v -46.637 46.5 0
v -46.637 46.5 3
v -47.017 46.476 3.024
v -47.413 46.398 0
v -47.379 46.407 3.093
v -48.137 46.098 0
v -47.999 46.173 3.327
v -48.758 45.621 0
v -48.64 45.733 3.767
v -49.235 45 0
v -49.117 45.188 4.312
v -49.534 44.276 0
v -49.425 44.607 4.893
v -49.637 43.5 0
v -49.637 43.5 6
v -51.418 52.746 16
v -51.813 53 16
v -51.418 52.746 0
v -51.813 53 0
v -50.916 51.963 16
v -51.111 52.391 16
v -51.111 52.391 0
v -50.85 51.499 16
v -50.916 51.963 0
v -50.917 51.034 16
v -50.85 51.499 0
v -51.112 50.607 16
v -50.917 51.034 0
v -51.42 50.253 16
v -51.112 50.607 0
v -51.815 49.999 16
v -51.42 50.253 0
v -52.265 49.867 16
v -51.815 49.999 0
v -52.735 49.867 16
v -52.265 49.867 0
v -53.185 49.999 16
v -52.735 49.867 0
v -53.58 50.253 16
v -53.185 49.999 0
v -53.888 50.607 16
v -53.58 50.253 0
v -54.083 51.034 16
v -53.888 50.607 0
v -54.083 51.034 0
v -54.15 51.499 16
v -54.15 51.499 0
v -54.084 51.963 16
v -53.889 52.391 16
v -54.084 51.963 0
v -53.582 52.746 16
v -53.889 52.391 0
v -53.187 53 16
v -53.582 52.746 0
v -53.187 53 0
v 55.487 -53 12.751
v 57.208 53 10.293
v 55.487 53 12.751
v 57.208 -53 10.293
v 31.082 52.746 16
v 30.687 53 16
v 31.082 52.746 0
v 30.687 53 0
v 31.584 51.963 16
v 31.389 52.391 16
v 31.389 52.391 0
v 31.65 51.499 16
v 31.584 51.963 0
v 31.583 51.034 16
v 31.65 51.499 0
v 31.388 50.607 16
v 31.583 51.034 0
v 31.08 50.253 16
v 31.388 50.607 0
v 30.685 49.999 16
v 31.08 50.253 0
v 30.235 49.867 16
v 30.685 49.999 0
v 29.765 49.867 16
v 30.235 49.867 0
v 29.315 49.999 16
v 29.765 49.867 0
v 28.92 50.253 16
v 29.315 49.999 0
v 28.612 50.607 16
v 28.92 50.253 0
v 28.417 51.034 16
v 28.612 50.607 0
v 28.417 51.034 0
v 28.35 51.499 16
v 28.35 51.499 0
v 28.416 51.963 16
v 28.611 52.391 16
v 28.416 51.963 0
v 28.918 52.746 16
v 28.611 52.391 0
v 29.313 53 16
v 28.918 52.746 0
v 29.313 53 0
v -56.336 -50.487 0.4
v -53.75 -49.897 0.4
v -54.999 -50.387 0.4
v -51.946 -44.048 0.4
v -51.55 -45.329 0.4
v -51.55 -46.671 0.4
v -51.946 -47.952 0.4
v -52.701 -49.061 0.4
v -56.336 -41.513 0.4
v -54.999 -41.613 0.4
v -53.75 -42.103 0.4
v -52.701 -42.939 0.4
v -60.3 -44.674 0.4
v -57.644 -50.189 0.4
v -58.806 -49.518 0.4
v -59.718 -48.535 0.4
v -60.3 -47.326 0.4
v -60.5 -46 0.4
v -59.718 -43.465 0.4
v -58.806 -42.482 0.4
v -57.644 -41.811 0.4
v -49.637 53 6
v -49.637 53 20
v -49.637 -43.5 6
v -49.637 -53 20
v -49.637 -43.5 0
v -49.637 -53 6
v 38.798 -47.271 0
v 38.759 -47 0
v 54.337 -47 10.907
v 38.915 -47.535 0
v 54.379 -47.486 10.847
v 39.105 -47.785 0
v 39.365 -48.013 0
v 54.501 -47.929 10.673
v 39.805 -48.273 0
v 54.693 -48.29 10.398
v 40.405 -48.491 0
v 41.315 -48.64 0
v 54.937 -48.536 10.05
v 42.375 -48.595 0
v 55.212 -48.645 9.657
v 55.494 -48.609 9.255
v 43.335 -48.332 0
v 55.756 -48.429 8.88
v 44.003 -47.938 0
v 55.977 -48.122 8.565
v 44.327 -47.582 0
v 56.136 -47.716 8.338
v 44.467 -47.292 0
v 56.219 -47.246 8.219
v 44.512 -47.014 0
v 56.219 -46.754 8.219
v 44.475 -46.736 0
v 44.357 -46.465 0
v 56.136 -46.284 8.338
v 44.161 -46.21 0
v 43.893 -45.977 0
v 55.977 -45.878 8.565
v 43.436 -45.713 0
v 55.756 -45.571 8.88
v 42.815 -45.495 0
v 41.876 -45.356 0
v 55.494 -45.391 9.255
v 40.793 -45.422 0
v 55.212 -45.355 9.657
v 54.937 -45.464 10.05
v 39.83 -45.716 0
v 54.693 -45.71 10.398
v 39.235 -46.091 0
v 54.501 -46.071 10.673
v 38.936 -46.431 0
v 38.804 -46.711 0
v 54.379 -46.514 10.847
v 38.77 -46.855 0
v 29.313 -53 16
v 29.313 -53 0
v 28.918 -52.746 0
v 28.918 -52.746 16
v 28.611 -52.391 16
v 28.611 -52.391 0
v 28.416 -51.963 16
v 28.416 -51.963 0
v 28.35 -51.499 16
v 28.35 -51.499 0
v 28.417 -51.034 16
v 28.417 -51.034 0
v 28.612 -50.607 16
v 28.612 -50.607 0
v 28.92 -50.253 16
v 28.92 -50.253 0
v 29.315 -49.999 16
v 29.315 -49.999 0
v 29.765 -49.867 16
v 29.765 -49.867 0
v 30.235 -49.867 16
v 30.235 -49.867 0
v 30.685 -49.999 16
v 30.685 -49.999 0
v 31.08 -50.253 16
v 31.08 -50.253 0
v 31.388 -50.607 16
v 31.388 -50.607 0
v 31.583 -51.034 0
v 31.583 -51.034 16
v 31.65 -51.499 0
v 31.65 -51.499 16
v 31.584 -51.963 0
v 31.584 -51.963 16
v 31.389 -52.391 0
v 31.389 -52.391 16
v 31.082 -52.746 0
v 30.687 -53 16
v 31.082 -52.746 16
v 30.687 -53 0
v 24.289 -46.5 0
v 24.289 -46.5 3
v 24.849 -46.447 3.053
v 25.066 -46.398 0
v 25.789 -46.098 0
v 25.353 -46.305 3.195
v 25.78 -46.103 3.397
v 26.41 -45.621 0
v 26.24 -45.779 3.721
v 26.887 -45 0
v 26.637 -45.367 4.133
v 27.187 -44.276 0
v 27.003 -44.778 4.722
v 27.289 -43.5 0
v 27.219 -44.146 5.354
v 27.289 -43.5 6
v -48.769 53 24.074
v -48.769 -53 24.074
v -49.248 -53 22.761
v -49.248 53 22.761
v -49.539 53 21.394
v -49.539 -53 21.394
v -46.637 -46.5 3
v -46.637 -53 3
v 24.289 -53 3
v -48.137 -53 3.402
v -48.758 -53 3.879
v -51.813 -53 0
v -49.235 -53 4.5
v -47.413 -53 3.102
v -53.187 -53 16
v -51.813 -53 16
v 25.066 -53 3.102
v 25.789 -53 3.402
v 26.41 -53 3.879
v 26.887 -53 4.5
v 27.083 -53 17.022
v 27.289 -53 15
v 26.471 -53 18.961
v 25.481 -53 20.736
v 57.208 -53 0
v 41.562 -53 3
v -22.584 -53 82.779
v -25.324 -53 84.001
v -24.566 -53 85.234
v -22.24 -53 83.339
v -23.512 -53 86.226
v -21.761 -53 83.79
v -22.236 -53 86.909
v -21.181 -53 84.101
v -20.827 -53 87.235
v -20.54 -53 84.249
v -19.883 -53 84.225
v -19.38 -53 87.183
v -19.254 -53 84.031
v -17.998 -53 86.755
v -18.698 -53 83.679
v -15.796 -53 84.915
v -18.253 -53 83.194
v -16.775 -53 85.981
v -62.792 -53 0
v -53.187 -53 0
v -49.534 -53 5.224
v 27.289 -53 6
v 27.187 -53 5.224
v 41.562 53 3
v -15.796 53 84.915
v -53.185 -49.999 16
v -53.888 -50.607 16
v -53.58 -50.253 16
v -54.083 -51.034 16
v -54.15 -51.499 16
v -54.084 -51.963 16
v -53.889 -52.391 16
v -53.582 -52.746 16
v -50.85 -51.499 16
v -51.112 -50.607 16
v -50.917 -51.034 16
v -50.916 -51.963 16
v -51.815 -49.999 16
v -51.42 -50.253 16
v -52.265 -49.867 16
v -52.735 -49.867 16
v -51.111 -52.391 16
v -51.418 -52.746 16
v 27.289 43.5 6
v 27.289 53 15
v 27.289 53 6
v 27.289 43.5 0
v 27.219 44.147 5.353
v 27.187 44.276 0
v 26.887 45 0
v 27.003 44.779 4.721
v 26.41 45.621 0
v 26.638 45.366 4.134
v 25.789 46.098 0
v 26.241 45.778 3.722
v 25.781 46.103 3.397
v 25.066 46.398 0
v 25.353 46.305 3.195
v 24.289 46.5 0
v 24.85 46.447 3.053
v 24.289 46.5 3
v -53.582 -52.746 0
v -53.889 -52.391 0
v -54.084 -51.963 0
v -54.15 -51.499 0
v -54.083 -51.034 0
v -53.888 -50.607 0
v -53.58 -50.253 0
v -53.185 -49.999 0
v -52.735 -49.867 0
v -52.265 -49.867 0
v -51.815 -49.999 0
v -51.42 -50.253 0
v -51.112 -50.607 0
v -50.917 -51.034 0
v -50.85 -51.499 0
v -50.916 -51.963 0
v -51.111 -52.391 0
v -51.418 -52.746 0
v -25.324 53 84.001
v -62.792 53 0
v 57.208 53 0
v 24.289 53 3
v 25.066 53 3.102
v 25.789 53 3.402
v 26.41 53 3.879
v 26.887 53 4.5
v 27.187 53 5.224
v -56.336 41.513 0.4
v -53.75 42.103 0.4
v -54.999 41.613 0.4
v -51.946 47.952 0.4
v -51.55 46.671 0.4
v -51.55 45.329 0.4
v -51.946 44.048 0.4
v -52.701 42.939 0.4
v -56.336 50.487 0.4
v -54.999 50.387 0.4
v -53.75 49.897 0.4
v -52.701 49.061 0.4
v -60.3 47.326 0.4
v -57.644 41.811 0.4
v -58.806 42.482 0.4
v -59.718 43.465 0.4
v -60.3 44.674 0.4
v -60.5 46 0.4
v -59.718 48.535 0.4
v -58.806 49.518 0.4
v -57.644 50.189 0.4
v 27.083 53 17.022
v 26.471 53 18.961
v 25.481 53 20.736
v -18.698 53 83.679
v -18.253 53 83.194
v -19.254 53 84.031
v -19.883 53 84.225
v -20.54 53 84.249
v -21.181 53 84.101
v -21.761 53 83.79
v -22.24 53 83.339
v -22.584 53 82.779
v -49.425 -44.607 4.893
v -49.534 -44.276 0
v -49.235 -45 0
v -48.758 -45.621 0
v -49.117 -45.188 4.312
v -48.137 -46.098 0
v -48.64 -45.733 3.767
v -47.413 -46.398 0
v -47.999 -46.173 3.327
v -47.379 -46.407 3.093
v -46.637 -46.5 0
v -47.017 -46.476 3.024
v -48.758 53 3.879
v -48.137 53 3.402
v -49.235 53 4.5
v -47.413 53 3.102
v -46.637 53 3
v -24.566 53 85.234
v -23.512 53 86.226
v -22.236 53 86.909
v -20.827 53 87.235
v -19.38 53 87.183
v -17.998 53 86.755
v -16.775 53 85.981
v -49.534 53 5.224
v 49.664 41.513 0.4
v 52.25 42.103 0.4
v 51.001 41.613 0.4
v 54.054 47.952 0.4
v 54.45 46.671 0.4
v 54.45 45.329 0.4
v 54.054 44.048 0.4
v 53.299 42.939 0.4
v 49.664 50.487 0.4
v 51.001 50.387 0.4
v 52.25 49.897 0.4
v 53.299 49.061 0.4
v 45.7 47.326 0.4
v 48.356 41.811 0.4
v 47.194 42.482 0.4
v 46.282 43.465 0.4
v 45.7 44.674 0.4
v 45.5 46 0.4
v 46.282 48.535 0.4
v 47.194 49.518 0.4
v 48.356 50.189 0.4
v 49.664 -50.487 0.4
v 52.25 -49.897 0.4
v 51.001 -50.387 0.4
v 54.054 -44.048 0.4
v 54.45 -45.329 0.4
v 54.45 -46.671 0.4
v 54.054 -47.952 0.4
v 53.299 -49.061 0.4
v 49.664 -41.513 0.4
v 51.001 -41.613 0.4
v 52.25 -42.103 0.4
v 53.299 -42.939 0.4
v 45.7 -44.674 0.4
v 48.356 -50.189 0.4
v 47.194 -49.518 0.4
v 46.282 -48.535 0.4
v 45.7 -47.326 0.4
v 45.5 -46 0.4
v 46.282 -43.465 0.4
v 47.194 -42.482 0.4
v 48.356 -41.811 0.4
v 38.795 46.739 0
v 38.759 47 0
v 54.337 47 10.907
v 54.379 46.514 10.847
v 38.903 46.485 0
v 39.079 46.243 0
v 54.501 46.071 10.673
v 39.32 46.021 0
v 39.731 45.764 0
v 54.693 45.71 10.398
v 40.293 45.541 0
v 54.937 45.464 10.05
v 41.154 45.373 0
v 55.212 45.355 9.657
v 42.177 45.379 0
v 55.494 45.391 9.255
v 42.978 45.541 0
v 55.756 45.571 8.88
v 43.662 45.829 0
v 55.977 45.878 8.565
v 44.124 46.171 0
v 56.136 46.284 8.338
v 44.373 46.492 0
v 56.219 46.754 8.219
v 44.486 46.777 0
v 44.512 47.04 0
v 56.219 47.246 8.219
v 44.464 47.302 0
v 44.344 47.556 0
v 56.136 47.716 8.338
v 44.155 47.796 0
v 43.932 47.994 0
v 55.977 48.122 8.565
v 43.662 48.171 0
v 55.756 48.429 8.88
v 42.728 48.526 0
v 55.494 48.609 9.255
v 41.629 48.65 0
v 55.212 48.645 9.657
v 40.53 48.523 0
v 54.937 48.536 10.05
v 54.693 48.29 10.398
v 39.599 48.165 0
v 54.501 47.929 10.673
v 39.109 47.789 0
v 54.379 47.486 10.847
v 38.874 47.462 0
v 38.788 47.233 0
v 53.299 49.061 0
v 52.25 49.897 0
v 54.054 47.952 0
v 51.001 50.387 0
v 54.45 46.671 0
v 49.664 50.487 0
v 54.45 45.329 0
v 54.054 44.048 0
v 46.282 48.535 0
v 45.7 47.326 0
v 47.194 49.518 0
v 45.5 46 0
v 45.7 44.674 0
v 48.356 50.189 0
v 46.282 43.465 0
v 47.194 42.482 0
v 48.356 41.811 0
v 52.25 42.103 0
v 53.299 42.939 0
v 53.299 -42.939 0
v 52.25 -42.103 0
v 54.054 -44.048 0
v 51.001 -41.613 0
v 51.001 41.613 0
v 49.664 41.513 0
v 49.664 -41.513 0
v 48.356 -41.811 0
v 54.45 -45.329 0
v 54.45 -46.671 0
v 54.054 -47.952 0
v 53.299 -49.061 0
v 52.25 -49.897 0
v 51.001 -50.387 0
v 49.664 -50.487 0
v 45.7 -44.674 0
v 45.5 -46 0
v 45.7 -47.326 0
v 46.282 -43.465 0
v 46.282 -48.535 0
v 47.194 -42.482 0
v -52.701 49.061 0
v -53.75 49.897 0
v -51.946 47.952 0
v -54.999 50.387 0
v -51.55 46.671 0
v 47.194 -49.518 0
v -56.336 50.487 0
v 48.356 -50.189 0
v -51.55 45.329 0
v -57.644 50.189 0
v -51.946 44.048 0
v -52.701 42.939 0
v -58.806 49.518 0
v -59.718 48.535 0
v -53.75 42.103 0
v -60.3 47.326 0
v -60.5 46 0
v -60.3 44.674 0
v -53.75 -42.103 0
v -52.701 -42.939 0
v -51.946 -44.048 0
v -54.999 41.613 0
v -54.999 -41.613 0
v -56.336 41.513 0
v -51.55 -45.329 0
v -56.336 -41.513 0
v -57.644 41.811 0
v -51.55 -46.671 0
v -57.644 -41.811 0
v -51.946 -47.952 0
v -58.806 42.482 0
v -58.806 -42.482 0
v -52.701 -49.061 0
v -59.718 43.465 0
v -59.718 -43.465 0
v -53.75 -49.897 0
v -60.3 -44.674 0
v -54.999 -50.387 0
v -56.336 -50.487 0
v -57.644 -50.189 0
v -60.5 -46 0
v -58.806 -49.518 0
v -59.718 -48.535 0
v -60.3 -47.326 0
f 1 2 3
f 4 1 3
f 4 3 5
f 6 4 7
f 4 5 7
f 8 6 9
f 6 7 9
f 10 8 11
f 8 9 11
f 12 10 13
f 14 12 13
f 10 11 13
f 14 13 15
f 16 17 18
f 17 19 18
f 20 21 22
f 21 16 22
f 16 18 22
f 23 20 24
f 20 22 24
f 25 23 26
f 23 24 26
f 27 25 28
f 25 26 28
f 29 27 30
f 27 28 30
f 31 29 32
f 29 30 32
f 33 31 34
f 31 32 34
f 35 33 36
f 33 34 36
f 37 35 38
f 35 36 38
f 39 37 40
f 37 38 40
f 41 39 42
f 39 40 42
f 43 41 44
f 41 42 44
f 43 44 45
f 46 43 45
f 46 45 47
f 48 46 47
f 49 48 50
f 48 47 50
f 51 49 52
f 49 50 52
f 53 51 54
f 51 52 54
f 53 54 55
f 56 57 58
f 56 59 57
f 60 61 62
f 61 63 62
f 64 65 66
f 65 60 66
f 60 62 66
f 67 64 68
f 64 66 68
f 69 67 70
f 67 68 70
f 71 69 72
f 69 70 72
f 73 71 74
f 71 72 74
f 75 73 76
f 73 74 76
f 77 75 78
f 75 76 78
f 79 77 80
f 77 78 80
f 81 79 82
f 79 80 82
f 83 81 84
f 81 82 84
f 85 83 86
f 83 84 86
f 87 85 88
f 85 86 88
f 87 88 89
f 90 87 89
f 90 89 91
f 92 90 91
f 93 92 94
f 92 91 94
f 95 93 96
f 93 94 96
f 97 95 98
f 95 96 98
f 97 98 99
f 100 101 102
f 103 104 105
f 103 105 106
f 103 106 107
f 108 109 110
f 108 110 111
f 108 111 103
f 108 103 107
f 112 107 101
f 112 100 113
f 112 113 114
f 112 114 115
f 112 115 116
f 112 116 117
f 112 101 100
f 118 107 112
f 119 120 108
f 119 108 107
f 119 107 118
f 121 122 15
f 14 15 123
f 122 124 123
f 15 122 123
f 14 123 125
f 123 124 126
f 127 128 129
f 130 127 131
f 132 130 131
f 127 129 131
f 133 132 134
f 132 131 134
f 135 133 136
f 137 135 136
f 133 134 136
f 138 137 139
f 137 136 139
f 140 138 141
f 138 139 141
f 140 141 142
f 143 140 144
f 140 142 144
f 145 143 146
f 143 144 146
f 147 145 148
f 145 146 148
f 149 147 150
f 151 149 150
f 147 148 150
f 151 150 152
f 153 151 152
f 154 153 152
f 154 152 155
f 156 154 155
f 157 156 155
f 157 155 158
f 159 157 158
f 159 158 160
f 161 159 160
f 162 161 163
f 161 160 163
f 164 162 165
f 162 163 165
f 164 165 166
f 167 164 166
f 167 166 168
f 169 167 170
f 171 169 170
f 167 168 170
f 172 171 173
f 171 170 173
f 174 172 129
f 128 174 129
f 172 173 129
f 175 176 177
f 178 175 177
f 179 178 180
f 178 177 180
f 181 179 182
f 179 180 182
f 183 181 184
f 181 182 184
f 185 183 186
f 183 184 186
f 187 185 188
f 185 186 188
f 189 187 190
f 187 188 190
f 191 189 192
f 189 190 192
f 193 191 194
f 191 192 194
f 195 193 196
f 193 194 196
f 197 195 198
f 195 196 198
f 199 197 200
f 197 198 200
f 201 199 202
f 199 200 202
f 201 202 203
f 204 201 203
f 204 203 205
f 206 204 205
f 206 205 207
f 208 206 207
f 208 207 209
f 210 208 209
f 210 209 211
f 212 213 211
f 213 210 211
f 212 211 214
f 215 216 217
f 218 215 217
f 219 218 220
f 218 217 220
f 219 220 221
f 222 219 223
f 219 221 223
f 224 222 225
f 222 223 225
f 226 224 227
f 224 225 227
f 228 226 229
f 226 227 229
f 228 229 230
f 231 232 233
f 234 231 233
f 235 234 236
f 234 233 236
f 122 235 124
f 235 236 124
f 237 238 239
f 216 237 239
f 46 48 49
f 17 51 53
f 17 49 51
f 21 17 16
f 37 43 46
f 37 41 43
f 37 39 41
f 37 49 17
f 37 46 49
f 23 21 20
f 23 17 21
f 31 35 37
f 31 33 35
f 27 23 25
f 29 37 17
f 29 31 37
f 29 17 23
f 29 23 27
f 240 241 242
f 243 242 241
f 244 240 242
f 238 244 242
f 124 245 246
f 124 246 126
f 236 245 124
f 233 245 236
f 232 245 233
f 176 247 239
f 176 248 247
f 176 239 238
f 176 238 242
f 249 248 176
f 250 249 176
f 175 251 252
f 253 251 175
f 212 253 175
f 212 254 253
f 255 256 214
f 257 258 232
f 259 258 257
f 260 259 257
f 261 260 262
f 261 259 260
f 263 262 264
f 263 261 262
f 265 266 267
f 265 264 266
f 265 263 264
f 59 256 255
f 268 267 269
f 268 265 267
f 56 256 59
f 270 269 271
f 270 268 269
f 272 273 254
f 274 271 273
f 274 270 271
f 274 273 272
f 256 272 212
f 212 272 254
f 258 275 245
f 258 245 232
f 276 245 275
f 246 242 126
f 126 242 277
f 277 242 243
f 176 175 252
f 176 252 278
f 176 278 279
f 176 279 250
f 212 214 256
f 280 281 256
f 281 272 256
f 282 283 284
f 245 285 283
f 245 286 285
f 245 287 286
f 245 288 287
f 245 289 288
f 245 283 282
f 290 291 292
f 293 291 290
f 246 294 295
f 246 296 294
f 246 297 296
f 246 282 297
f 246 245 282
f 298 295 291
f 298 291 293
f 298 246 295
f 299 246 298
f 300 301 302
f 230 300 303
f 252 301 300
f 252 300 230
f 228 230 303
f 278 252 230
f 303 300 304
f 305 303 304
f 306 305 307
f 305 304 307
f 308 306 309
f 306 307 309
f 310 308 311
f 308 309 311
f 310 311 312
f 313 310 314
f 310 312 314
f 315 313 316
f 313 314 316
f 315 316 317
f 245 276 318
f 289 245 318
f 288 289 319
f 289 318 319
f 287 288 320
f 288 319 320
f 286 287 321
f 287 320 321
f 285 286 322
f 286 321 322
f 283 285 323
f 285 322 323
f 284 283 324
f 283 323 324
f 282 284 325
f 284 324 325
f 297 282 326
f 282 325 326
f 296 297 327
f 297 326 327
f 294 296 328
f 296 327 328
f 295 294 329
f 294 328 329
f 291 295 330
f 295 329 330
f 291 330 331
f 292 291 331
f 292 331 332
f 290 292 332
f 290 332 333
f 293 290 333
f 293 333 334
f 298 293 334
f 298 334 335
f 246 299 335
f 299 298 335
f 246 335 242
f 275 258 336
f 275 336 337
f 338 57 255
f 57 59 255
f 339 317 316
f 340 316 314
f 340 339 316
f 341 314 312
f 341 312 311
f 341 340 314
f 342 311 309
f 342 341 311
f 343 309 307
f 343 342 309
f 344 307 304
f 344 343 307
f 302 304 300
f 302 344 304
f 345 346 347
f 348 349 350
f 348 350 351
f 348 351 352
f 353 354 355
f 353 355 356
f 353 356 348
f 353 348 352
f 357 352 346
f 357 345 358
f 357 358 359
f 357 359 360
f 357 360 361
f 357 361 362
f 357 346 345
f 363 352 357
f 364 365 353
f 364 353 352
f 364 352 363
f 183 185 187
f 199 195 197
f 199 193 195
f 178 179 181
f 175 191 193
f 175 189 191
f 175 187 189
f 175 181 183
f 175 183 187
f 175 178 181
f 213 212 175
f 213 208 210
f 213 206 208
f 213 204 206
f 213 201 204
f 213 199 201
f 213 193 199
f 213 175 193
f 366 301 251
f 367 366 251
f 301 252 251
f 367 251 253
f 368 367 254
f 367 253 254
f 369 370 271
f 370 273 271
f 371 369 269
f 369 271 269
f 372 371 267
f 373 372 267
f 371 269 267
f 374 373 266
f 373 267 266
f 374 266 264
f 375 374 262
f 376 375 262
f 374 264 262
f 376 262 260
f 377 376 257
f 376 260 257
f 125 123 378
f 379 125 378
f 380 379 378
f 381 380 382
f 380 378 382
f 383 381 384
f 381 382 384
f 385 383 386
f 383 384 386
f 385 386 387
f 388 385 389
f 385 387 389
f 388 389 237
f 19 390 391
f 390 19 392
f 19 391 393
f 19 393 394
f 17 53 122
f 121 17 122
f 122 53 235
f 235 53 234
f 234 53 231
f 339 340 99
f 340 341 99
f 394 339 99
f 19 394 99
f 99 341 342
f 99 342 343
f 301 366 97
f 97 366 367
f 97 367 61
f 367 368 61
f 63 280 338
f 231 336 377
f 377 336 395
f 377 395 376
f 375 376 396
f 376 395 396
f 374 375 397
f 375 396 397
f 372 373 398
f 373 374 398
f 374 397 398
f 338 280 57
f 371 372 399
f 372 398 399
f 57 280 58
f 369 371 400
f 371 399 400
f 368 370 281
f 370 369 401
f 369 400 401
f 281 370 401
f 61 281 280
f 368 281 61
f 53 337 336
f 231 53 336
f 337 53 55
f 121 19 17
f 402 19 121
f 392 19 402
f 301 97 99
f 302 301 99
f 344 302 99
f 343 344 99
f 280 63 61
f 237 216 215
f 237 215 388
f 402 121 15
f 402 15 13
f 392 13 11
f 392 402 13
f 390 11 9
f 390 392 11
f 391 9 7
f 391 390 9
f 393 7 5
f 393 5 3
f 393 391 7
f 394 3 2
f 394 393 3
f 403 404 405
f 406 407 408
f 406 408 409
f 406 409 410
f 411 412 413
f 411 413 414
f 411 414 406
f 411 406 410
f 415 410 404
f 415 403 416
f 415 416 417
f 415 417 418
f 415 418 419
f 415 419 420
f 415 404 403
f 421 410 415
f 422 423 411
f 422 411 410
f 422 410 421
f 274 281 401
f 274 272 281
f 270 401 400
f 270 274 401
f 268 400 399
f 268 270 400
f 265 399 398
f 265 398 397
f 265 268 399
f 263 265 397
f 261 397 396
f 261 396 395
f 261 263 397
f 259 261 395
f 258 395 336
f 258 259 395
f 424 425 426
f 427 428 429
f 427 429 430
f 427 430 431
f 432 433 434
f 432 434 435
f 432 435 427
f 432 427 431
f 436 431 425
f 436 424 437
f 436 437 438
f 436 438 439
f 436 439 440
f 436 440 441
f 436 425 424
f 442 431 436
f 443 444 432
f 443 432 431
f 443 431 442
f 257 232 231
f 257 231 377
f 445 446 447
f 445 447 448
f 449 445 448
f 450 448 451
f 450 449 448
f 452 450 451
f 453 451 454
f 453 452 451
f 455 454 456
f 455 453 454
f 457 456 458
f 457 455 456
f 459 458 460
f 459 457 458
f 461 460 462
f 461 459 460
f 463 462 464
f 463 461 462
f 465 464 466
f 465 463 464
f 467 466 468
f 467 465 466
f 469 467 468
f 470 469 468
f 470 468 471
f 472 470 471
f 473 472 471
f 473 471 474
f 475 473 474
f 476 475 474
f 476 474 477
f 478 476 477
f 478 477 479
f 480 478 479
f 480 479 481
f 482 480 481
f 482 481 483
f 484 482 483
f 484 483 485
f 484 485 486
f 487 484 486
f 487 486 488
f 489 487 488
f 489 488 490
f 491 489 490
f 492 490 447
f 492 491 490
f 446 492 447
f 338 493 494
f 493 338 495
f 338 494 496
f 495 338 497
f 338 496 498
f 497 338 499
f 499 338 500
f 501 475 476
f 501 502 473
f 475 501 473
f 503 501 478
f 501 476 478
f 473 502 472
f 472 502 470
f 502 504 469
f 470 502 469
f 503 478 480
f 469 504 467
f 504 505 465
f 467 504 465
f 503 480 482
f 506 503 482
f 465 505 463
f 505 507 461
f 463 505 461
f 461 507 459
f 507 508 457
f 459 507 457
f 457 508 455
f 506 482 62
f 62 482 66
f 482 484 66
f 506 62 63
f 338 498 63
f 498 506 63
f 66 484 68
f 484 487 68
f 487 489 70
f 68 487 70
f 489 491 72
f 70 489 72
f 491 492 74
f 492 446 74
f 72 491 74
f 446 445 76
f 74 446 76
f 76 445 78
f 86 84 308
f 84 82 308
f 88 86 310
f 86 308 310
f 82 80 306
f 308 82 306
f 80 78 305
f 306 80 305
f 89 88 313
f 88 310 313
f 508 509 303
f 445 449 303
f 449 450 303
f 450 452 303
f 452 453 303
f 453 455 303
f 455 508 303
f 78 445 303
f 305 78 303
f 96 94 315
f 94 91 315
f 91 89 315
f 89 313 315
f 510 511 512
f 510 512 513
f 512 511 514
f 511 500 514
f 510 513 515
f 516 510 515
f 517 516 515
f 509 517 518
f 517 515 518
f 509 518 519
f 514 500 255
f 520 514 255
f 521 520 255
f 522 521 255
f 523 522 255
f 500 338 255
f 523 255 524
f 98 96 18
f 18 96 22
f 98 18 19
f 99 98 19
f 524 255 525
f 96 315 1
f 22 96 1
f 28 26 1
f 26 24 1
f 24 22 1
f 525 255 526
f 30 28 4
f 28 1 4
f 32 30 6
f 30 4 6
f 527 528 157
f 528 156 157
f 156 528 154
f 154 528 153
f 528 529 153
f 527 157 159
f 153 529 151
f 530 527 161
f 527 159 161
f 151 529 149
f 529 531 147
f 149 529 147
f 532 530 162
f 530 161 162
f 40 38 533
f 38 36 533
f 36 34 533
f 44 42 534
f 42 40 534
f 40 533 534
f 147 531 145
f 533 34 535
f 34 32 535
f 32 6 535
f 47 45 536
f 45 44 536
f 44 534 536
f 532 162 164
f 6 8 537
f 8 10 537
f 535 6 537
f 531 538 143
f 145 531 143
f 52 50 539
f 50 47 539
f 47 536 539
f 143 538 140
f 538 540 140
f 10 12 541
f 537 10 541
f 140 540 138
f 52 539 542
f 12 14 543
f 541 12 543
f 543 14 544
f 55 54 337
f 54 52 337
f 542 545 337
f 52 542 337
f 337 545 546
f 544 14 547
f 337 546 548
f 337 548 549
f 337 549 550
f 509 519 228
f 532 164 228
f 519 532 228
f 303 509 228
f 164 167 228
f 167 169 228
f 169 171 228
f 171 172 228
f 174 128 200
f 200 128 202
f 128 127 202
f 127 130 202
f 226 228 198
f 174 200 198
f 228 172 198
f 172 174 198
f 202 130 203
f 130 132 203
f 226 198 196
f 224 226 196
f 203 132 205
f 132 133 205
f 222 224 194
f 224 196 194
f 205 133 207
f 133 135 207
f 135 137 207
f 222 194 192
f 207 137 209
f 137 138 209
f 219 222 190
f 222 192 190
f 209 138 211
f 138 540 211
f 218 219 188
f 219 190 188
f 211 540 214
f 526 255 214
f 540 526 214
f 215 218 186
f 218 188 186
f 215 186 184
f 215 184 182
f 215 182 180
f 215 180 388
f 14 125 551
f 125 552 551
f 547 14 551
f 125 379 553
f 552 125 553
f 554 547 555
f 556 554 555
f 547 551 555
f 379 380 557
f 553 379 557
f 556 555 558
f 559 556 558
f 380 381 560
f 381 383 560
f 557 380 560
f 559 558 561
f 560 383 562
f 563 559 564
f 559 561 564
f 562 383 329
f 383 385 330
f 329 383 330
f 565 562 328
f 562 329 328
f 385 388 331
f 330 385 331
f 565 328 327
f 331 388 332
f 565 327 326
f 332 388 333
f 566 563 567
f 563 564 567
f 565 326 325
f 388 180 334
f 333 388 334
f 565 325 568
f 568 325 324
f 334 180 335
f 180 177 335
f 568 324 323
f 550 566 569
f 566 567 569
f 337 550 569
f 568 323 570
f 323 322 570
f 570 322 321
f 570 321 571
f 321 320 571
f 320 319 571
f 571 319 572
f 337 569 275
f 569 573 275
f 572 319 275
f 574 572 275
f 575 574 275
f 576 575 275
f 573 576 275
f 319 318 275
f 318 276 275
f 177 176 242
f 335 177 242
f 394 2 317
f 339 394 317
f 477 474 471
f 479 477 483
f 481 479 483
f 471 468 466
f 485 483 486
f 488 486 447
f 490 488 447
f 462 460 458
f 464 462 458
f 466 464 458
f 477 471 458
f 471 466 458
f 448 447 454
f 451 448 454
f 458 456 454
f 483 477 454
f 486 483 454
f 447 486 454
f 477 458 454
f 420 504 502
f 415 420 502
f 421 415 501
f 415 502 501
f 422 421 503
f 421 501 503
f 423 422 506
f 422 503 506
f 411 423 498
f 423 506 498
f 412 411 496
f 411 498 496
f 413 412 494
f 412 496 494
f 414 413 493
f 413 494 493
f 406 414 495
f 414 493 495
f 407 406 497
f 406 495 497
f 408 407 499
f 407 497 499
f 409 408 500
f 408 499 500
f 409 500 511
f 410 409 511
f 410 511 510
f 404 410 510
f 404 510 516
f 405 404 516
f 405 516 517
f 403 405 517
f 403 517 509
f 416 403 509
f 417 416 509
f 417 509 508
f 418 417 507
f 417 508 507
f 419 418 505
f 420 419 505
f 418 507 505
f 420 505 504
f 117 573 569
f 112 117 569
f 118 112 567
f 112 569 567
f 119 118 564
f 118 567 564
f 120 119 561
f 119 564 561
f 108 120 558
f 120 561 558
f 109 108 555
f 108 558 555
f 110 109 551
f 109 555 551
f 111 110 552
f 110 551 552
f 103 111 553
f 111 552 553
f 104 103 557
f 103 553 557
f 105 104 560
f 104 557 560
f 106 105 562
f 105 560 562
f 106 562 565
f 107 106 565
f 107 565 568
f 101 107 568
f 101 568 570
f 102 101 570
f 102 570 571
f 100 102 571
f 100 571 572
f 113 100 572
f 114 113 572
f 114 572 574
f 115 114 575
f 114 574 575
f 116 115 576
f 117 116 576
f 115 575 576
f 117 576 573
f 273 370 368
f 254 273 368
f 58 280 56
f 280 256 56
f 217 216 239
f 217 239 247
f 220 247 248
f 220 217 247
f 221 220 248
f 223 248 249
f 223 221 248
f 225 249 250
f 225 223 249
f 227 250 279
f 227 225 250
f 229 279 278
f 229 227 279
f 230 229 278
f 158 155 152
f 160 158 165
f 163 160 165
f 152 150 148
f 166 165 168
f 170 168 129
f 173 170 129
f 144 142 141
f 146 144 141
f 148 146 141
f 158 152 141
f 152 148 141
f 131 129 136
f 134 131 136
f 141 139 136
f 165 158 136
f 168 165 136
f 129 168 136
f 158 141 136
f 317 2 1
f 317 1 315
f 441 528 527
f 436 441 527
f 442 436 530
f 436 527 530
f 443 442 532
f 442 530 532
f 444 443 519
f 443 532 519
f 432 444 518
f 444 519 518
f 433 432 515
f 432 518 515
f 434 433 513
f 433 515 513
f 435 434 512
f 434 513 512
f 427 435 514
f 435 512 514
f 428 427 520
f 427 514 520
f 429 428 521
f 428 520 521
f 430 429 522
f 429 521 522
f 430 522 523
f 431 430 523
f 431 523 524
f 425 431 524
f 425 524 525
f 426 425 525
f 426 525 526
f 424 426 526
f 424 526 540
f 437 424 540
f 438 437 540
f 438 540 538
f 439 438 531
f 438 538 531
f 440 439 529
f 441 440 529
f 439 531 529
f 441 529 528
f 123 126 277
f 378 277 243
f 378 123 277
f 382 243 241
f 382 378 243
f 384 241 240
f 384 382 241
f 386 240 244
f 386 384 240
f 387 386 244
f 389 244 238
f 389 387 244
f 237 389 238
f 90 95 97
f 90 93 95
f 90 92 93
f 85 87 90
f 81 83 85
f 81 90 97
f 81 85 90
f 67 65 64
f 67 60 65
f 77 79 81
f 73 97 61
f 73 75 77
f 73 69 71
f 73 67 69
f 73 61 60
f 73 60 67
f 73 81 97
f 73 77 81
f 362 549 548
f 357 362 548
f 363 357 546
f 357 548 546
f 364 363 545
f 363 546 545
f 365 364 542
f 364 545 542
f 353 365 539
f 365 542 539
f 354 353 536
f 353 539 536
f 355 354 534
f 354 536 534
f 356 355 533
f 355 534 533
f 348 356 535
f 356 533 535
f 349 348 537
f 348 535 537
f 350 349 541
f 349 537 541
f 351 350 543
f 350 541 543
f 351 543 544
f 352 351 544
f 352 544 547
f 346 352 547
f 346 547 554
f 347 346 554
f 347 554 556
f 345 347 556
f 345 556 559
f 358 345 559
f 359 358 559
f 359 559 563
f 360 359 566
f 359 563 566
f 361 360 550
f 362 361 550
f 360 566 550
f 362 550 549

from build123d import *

# Parameters (mm, degrees)
PAD_DEPTH       = 53
SKETCH001_R     = 1.65
POCKET_DEPTH    = 15
SKETCH002_R     = 1.65
POCKET001_DEPTH = 16
SKETCH003_R     = 4.5
POCKET002_DEPTH = 0.4
FILLET_R        = 3
POCKET003_DEPTH = 6


with BuildPart() as part:
    # Sketch → Pad (new body, symmetric)
    with BuildSketch(Plane.XZ):
        with BuildLine():
            ThreePointArc((-15.795942, 84.915204), (-20.82658, 87.235391), (-25.324265, 84.000982))
            Line((-25.324265, 84.000982), (-62.791985, 0))
            Line((57.208015, 0), (-62.791985, 0))
            Line((57.208015, 10.293343), (57.208015, 0))
            Line((57.208015, 10.293343), (55.487286, 12.750799))
            Line((41.561701, 3), (55.487286, 12.750799))
            Line((-15.795942, 84.915204), (41.561701, 3))
        make_face()
        with BuildLine():
            Line((-48.769346, 24.073542), (-22.584454, 82.77892))
            ThreePointArc((-18.253399, 83.194475), (-20.540052, 84.249105), (-22.584454, 82.77892))
            Line((-18.253399, 83.194475), (25.480661, 20.735764))
            ThreePointArc((27.289141, 15), (26.826311, 18.007058), (25.480661, 20.735764))
            Line((27.289141, 15), (27.289141, 3))
            Line((-49.636644, 3), (27.289141, 3))
            Line((-49.636644, 20), (-49.636644, 3))
            ThreePointArc((-48.769346, 24.073542), (-49.417416, 22.082423), (-49.636644, 20))
        make_face(mode=Mode.SUBTRACT)
    extrude(amount=PAD_DEPTH, both=True)

    # Sketch001 (on Face3 of Pad) → Pocket (cut, symmetric)
    with BuildSketch(Plane(origin=(29.297859, 0, 20.514582), x_dir=(-0.573576, 0, 0.819152), z_dir=(0.819152, 0, 0.573576))):
        with Locations((-23.881356, -47)):
            Circle(SKETCH001_R)
        with Locations((-23.881356, 47)):
            Circle(SKETCH001_R)
    extrude(amount=POCKET_DEPTH, both=True, mode=Mode.SUBTRACT)

    # Sketch002 (on Face6 of Pocket) → Pocket001 (cut)
    with BuildSketch(Plane(origin=(0, 0, 0), x_dir=(1, 0, 0), z_dir=(0, 0, -1))):
        with Locations((-52.5, 51.5)):
            Circle(SKETCH002_R)
        with Locations((30, 51.5)):
            Circle(SKETCH002_R)
        with Locations((30, -51.5)):
            Circle(SKETCH002_R)
        with Locations((-52.5, -51.5)):
            Circle(SKETCH002_R)
    extrude(amount=-POCKET001_DEPTH, mode=Mode.SUBTRACT)

    # Sketch003 → Pocket002 (cut)
    with BuildSketch(Plane(origin=(0, 0, 0), x_dir=(-1, 0, 0), z_dir=(0, 0, -1))):
        with Locations((-50, 46)):
            Circle(SKETCH003_R)
        with Locations((56, 46)):
            Circle(SKETCH003_R)
        with Locations((-50, -46)):
            Circle(SKETCH003_R)
        with Locations((56, -46)):
            Circle(SKETCH003_R)
    extrude(amount=-POCKET002_DEPTH, mode=Mode.SUBTRACT)

    # Fillet
    fillet_edges = [part.edges().sort_by_distance(p)[0] for p in [
        (27.289141, 0, 3),
        (-49.636644, 0, 3),
    ]]
    fillet(fillet_edges, radius=FILLET_R)

    # Sketch004 (on Face5 of Fillet) → Pocket003 (cut, symmetric)
    with BuildSketch(Plane(origin=(0, 0, 3), x_dir=(-1, 0, 0), z_dir=(0, 0, 1))):
        with BuildLine():
            Line((-24.289141, 46.5), (46.636644, 46.5))
            ThreePointArc((49.636644, 43.5), (48.757964, 45.62132), (46.636644, 46.5))
            Line((49.636644, 43.5), (49.636644, -43.5))
            ThreePointArc((46.636644, -46.5), (48.757964, -45.62132), (49.636644, -43.5))
            Line((46.636644, -46.5), (-24.289141, -46.5))
            ThreePointArc((-27.289141, -43.5), (-26.410461, -45.62132), (-24.289141, -46.5))
            Line((-27.289141, -43.5), (-27.289141, 43.5))
            ThreePointArc((-24.289141, 46.5), (-26.410461, 45.62132), (-27.289141, 43.5))
        make_face()
    extrude(amount=POCKET003_DEPTH, both=True, mode=Mode.SUBTRACT)


solid = part.part
